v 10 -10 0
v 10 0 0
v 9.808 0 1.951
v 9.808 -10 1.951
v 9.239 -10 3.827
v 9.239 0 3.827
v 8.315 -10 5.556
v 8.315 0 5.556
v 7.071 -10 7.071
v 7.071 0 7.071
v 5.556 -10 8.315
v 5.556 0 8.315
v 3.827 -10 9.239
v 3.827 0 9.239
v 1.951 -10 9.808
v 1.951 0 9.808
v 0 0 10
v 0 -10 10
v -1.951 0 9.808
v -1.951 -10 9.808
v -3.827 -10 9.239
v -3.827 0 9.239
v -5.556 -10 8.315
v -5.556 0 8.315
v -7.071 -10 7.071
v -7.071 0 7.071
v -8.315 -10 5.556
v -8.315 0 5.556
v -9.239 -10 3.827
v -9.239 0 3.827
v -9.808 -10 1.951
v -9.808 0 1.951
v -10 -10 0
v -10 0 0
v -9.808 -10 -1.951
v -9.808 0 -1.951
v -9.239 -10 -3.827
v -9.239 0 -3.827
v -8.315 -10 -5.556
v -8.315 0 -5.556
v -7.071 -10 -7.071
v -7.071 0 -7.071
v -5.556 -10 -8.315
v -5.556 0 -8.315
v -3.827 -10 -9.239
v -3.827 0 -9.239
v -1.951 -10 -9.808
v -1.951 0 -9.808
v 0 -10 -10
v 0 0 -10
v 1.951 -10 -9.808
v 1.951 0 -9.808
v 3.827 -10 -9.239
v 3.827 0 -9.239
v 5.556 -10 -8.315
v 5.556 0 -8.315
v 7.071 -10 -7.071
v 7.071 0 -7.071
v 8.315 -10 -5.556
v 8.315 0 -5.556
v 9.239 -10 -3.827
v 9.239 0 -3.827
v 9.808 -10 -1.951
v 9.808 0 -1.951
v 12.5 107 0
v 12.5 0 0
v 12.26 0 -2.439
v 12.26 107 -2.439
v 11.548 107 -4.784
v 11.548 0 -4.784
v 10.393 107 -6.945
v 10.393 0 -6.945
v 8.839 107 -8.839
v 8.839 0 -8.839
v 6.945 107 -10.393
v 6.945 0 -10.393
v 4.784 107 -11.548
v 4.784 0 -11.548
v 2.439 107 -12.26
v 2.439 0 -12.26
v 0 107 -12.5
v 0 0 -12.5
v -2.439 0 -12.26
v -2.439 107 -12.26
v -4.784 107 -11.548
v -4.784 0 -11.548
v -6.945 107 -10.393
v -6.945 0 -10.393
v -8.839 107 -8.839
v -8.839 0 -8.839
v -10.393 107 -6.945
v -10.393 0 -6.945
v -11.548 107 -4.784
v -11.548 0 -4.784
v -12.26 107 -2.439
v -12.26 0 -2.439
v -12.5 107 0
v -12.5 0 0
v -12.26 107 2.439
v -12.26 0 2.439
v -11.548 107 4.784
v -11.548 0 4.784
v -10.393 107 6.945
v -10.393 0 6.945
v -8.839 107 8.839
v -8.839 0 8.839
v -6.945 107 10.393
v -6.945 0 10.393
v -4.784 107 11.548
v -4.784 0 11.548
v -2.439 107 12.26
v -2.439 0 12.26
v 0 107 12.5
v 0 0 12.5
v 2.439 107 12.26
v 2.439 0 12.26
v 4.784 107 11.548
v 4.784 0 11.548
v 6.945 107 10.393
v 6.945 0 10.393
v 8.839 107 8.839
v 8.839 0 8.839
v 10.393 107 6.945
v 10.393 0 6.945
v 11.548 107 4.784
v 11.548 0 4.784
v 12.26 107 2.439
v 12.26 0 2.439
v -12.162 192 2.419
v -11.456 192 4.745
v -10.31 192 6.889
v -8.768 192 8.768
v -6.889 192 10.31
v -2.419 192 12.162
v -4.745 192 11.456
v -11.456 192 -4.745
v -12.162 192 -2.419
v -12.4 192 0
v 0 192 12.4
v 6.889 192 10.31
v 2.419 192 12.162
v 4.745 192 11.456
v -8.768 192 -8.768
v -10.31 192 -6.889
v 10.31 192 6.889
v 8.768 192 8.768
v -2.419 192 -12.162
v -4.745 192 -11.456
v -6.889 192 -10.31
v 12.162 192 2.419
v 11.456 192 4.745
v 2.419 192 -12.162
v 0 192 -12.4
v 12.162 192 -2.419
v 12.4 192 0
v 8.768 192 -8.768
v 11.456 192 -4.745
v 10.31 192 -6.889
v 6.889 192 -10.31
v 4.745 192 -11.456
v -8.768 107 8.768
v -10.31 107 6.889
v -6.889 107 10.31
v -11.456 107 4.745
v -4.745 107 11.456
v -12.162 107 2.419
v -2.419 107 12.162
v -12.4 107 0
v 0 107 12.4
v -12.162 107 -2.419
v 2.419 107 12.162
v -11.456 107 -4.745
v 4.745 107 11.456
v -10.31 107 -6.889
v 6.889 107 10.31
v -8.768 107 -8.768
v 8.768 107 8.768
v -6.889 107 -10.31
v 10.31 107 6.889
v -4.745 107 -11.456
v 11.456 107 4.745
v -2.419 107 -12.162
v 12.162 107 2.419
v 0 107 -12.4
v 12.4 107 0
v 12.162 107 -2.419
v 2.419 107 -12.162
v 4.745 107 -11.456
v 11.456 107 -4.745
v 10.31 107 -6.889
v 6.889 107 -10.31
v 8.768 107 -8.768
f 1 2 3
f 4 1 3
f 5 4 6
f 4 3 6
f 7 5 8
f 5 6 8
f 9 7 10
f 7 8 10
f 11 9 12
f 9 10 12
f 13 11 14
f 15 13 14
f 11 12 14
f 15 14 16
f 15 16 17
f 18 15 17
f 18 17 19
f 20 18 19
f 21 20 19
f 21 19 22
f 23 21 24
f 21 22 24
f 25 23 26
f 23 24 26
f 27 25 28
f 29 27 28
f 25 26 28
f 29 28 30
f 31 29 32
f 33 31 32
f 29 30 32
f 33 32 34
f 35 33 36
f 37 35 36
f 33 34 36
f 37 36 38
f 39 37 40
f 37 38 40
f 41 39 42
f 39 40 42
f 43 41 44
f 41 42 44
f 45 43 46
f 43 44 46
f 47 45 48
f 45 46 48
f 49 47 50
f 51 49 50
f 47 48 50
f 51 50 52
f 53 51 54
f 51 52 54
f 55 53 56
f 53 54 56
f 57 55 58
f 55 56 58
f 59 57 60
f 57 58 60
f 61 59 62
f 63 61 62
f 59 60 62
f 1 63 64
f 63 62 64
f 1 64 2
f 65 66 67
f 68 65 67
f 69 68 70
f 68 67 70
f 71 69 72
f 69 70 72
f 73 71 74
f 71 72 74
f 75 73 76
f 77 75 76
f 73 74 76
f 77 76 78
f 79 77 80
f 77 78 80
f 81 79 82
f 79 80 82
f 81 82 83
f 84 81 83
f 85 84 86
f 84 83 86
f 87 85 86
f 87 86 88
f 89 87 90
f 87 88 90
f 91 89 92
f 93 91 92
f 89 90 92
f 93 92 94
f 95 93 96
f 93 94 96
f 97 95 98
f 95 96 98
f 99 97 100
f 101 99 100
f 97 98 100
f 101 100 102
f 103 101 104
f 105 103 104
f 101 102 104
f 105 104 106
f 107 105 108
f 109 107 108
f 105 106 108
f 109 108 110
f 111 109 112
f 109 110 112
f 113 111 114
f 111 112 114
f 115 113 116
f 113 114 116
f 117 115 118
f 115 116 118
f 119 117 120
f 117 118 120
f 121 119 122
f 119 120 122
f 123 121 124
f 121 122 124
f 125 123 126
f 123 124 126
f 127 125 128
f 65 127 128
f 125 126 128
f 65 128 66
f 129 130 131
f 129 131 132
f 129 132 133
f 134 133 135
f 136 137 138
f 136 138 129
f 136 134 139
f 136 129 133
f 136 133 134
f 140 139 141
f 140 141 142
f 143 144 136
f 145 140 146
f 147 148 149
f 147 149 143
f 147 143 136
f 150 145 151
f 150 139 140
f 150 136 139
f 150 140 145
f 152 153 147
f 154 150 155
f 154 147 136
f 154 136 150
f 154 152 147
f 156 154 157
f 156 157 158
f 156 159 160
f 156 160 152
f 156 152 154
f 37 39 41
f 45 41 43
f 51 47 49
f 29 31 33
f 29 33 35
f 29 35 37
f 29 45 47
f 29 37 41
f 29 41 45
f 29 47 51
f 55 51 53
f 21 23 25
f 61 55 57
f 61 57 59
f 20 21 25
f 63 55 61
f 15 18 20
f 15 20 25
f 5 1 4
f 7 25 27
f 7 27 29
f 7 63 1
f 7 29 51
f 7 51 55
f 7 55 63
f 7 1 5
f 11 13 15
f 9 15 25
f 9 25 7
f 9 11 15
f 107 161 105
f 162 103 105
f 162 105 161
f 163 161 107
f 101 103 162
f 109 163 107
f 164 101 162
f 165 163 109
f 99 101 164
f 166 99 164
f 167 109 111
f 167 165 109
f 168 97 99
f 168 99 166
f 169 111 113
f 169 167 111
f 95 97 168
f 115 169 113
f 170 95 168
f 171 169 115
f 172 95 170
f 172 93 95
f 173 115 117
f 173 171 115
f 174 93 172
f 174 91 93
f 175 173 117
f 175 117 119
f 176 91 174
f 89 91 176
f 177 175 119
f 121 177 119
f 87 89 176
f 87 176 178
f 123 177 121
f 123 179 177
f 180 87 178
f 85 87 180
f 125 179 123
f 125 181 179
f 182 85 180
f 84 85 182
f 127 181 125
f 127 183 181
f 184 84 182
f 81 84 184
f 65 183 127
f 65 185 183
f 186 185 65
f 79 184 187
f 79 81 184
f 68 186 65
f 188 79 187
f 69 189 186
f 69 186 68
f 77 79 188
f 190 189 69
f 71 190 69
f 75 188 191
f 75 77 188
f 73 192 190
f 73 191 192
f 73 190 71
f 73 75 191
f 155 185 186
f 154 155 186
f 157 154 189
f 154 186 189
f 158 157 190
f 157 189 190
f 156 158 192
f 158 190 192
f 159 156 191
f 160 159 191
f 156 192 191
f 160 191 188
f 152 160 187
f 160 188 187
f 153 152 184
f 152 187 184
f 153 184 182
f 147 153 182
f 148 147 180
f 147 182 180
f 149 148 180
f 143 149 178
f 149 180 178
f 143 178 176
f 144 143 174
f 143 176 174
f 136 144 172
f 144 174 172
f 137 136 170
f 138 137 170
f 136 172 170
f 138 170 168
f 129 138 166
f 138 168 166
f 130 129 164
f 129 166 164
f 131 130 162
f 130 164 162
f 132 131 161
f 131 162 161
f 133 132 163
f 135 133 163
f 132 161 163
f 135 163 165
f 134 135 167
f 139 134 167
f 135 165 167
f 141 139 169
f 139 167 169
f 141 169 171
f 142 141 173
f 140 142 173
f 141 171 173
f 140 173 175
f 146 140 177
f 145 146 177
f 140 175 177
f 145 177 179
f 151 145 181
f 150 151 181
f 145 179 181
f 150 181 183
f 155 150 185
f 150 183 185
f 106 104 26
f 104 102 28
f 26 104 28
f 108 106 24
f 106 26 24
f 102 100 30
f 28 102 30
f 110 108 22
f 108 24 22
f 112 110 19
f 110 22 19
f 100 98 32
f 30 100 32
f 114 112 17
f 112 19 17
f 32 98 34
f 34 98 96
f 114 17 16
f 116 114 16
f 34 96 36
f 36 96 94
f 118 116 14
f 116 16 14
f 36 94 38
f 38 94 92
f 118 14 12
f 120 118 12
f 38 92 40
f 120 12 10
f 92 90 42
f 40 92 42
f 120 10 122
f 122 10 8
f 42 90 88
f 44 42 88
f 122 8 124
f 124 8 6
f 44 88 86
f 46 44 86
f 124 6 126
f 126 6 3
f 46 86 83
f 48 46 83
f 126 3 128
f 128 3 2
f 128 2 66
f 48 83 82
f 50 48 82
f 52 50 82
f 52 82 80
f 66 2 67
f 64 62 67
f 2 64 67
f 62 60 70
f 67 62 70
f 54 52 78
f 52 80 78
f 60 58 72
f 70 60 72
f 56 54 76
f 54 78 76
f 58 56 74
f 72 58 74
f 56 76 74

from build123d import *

# Parameters (mm, degrees)
SKETCH1_R           = 12.5
BOSS_EXTRUDE1_DEPTH = 107
SKETCH2_R           = 12.4
BOSS_EXTRUDE2_DEPTH = 85
SKETCH3_R           = 10
BOSS_EXTRUDE3_DEPTH = 10


with BuildPart() as part:
    # Sketch1 → Boss-Extrude1 (new body)
    with BuildSketch(Plane(origin=(0, 0, 0), x_dir=(1, 0, 0), z_dir=(0, 1, 0))):
        Circle(SKETCH1_R)
    extrude(amount=BOSS_EXTRUDE1_DEPTH)

    # Sketch2 → Boss-Extrude2 (add)
    with BuildSketch(Plane(origin=(0, 107, 0), x_dir=(1, 0, 0), z_dir=(0, 1, 0))):
        Circle(SKETCH2_R)
    extrude(amount=BOSS_EXTRUDE2_DEPTH)

    # Sketch3 → Boss-Extrude3 (add)
    with BuildSketch(Plane.XZ):
        Circle(SKETCH3_R)
    extrude(amount=BOSS_EXTRUDE3_DEPTH)


solid = part.part
